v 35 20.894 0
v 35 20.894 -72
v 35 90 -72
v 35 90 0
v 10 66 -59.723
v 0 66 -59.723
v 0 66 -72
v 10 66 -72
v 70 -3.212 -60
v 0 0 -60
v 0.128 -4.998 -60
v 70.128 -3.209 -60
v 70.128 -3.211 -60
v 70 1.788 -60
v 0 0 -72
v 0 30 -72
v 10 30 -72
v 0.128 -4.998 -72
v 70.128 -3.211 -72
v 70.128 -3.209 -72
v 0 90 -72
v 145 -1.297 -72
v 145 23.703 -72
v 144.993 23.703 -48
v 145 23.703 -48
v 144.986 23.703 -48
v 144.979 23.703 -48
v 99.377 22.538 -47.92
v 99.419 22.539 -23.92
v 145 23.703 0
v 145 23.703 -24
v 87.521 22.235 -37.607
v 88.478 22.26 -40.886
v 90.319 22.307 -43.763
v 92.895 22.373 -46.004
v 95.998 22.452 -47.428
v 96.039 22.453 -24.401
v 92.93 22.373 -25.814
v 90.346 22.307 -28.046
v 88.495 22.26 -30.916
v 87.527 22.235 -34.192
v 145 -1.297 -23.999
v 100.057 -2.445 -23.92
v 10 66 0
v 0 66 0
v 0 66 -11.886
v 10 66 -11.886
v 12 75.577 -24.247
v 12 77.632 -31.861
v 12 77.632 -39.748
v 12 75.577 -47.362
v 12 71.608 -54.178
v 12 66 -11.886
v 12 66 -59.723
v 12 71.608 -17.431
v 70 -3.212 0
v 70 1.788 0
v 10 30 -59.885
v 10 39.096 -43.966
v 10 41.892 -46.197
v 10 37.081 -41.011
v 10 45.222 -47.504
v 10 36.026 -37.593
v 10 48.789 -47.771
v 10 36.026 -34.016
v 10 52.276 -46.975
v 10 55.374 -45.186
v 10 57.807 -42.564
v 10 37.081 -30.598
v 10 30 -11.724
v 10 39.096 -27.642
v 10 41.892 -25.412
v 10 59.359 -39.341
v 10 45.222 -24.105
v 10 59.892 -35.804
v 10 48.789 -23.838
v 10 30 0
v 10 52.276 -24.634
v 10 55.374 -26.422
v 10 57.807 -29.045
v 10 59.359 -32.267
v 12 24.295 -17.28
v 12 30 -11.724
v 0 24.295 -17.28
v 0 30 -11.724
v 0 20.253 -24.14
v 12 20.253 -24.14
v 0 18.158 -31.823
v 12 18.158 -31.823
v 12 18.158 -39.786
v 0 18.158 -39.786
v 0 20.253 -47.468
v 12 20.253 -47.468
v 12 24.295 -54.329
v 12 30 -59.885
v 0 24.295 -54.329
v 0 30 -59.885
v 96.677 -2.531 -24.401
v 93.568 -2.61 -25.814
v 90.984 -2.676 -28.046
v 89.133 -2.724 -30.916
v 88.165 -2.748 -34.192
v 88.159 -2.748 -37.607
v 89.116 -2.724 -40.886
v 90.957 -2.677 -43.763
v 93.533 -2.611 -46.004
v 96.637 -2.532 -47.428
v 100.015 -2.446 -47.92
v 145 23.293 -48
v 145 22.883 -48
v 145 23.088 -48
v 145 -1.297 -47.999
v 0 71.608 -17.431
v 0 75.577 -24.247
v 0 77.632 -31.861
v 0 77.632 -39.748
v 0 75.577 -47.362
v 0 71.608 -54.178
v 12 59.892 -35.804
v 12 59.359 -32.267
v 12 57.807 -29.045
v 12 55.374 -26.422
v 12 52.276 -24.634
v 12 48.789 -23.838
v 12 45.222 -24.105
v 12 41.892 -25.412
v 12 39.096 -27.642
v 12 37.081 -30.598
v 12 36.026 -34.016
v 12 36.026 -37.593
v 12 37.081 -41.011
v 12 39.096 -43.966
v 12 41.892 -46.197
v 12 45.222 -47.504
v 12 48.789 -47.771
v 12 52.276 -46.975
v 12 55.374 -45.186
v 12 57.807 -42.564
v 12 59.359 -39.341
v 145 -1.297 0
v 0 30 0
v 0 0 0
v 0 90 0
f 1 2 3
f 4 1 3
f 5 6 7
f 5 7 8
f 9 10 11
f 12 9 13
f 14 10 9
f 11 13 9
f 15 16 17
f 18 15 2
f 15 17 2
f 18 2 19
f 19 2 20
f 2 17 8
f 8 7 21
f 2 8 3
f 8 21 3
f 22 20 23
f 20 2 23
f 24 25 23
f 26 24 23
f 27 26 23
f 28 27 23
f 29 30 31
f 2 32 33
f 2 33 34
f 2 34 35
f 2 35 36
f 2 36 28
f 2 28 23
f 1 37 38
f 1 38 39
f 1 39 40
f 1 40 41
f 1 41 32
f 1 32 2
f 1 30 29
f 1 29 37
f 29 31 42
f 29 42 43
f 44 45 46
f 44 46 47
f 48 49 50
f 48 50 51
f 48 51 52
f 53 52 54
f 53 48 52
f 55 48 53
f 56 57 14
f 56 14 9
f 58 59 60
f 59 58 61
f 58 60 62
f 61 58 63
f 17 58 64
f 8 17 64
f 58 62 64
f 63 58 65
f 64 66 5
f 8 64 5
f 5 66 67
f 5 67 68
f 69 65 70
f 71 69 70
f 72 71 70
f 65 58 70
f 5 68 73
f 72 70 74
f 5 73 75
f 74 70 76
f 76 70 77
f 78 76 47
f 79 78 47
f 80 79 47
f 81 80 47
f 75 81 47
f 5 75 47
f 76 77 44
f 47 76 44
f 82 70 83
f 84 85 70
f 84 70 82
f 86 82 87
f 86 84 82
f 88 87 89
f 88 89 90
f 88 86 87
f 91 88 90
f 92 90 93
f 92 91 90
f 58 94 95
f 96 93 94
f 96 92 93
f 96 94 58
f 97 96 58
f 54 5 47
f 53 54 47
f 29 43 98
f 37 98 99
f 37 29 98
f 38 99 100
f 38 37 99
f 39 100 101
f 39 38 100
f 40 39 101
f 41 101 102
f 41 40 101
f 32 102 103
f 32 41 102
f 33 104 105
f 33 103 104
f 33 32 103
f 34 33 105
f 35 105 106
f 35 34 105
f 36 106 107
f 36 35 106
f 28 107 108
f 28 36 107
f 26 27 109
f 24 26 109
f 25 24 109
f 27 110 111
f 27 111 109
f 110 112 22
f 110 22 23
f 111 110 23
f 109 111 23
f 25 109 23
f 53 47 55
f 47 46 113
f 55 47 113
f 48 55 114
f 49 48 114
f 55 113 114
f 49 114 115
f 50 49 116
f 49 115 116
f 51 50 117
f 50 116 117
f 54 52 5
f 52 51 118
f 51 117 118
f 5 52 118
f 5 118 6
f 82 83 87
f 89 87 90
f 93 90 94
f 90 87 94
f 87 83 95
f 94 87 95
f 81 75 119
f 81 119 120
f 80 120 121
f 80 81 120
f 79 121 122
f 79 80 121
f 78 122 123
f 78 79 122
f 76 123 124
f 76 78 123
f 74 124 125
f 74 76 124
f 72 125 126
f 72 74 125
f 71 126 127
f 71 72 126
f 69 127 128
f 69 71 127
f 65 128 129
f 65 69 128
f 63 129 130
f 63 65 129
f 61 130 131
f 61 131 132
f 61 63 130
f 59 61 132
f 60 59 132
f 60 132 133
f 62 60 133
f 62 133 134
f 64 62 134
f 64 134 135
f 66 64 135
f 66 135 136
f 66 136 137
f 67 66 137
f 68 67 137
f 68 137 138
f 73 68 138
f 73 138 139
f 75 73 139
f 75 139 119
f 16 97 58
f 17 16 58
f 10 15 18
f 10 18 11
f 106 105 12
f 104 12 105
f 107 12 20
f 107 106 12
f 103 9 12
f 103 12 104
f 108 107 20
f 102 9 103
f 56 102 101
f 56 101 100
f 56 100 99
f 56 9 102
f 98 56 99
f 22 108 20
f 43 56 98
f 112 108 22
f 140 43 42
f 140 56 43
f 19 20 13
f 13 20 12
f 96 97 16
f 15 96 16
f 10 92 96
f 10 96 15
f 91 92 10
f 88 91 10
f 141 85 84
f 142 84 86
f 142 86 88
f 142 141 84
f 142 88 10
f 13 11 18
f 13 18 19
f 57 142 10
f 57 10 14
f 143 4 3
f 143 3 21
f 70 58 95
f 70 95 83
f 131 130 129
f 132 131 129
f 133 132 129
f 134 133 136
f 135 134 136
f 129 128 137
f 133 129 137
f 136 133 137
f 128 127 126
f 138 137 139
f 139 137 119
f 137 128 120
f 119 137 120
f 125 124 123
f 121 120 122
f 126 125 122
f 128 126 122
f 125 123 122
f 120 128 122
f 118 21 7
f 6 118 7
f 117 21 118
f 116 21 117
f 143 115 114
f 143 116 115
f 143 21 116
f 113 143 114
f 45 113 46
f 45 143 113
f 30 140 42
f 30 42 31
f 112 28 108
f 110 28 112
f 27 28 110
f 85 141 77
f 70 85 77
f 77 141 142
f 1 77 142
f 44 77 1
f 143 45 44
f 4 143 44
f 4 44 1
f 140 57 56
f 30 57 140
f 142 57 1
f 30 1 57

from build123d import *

# Parameters (mm, degrees)
BOSS_EXTRUDE1_DEPTH = 72
SKETCH2_W           = 10
SKETCH2_H           = 36
CUT_EXTRUDE1_DEPTH  = 72
SKETCH3_R           = 12
CUT_EXTRUDE3_DEPTH  = 12
CUT_EXTRUDE4_DEPTH  = 32
SKETCH5_W           = 70.022826976
SKETCH5_H           = 12
BOSS_EXTRUDE2_DEPTH = 5


with BuildPart() as part:
    # Sketch1 → Boss-Extrude1 (new body)
    with BuildSketch(Plane.XY):
        Polygon((0, 0), (70, 1.787819253), (70, -3.212180747), (145, -1.296660118), (145, 23.703339882), (35, 20.893909627), (35, 90), (0, 90), align=None)
    extrude(amount=-BOSS_EXTRUDE1_DEPTH)

    # Sketch2 → Cut-Extrude1 (cut)
    with BuildSketch(Plane.XY):
        with Locations((5, 48)):
            Rectangle(SKETCH2_W, SKETCH2_H)
    extrude(amount=-CUT_EXTRUDE1_DEPTH, mode=Mode.SUBTRACT)

    # Sketch3 → Cut-Extrude3 (cut)
    with BuildSketch(Plane(origin=(0, 0, 0), x_dir=(0, 0, -1), z_dir=(1, 0, 0))):
        with Locations(Location((35.804414242, 47.892382062, 0), (0, 0, 90))):
            Circle(SKETCH3_R)
        with BuildLine():
            Line((59.723322508, 66), (11.885505976, 66))
            ThreePointArc((11.885505976, 66), (35.804414242, 77.892382062), (59.723322508, 66))
        make_face()
        with BuildLine():
            Line((59.88475195, 30), (11.724076534, 30))
            ThreePointArc((11.724076534, 30), (35.804414242, 17.892382062), (59.88475195, 30))
        make_face()
    extrude(amount=CUT_EXTRUDE3_DEPTH, mode=Mode.SUBTRACT)

    # Sketch4 → Cut-Extrude4 (cut)
    with BuildSketch(Plane(origin=(-0.510472517, 19.986962392, 0), x_dir=(0.9996740066520181, 0.025531949089344263, 0), z_dir=(-0.025531949089344263, 0.9996740066520181, 0))):
        with BuildLine():
            Line((99.920378063, 47.920353232), (145.536976224, 47.999981717))
            ThreePointArc((145.536976224, 47.999981717), (157.557905149, 36.020947208), (145.57887064, 24.000018283))
            Line((145.57887064, 24.000018283), (99.962272479, 23.920389797))
            ThreePointArc((99.962272479, 23.920389797), (87.941343554, 35.899424307), (99.920378063, 47.920353232))
        make_face()
    extrude(amount=-CUT_EXTRUDE4_DEPTH, mode=Mode.SUBTRACT)

    # Sketch5 → Boss-Extrude2 (add)
    with BuildSketch(Plane(origin=(0, 0, 0), x_dir=(0.9996740066520181, 0.025531949089344187, 0), z_dir=(0.025531949089344187, -0.9996740066520181, 0))):
        with Locations((35.011413488, -66)):
            Rectangle(SKETCH5_W, SKETCH5_H)
    extrude(amount=BOSS_EXTRUDE2_DEPTH)


solid = part.part
